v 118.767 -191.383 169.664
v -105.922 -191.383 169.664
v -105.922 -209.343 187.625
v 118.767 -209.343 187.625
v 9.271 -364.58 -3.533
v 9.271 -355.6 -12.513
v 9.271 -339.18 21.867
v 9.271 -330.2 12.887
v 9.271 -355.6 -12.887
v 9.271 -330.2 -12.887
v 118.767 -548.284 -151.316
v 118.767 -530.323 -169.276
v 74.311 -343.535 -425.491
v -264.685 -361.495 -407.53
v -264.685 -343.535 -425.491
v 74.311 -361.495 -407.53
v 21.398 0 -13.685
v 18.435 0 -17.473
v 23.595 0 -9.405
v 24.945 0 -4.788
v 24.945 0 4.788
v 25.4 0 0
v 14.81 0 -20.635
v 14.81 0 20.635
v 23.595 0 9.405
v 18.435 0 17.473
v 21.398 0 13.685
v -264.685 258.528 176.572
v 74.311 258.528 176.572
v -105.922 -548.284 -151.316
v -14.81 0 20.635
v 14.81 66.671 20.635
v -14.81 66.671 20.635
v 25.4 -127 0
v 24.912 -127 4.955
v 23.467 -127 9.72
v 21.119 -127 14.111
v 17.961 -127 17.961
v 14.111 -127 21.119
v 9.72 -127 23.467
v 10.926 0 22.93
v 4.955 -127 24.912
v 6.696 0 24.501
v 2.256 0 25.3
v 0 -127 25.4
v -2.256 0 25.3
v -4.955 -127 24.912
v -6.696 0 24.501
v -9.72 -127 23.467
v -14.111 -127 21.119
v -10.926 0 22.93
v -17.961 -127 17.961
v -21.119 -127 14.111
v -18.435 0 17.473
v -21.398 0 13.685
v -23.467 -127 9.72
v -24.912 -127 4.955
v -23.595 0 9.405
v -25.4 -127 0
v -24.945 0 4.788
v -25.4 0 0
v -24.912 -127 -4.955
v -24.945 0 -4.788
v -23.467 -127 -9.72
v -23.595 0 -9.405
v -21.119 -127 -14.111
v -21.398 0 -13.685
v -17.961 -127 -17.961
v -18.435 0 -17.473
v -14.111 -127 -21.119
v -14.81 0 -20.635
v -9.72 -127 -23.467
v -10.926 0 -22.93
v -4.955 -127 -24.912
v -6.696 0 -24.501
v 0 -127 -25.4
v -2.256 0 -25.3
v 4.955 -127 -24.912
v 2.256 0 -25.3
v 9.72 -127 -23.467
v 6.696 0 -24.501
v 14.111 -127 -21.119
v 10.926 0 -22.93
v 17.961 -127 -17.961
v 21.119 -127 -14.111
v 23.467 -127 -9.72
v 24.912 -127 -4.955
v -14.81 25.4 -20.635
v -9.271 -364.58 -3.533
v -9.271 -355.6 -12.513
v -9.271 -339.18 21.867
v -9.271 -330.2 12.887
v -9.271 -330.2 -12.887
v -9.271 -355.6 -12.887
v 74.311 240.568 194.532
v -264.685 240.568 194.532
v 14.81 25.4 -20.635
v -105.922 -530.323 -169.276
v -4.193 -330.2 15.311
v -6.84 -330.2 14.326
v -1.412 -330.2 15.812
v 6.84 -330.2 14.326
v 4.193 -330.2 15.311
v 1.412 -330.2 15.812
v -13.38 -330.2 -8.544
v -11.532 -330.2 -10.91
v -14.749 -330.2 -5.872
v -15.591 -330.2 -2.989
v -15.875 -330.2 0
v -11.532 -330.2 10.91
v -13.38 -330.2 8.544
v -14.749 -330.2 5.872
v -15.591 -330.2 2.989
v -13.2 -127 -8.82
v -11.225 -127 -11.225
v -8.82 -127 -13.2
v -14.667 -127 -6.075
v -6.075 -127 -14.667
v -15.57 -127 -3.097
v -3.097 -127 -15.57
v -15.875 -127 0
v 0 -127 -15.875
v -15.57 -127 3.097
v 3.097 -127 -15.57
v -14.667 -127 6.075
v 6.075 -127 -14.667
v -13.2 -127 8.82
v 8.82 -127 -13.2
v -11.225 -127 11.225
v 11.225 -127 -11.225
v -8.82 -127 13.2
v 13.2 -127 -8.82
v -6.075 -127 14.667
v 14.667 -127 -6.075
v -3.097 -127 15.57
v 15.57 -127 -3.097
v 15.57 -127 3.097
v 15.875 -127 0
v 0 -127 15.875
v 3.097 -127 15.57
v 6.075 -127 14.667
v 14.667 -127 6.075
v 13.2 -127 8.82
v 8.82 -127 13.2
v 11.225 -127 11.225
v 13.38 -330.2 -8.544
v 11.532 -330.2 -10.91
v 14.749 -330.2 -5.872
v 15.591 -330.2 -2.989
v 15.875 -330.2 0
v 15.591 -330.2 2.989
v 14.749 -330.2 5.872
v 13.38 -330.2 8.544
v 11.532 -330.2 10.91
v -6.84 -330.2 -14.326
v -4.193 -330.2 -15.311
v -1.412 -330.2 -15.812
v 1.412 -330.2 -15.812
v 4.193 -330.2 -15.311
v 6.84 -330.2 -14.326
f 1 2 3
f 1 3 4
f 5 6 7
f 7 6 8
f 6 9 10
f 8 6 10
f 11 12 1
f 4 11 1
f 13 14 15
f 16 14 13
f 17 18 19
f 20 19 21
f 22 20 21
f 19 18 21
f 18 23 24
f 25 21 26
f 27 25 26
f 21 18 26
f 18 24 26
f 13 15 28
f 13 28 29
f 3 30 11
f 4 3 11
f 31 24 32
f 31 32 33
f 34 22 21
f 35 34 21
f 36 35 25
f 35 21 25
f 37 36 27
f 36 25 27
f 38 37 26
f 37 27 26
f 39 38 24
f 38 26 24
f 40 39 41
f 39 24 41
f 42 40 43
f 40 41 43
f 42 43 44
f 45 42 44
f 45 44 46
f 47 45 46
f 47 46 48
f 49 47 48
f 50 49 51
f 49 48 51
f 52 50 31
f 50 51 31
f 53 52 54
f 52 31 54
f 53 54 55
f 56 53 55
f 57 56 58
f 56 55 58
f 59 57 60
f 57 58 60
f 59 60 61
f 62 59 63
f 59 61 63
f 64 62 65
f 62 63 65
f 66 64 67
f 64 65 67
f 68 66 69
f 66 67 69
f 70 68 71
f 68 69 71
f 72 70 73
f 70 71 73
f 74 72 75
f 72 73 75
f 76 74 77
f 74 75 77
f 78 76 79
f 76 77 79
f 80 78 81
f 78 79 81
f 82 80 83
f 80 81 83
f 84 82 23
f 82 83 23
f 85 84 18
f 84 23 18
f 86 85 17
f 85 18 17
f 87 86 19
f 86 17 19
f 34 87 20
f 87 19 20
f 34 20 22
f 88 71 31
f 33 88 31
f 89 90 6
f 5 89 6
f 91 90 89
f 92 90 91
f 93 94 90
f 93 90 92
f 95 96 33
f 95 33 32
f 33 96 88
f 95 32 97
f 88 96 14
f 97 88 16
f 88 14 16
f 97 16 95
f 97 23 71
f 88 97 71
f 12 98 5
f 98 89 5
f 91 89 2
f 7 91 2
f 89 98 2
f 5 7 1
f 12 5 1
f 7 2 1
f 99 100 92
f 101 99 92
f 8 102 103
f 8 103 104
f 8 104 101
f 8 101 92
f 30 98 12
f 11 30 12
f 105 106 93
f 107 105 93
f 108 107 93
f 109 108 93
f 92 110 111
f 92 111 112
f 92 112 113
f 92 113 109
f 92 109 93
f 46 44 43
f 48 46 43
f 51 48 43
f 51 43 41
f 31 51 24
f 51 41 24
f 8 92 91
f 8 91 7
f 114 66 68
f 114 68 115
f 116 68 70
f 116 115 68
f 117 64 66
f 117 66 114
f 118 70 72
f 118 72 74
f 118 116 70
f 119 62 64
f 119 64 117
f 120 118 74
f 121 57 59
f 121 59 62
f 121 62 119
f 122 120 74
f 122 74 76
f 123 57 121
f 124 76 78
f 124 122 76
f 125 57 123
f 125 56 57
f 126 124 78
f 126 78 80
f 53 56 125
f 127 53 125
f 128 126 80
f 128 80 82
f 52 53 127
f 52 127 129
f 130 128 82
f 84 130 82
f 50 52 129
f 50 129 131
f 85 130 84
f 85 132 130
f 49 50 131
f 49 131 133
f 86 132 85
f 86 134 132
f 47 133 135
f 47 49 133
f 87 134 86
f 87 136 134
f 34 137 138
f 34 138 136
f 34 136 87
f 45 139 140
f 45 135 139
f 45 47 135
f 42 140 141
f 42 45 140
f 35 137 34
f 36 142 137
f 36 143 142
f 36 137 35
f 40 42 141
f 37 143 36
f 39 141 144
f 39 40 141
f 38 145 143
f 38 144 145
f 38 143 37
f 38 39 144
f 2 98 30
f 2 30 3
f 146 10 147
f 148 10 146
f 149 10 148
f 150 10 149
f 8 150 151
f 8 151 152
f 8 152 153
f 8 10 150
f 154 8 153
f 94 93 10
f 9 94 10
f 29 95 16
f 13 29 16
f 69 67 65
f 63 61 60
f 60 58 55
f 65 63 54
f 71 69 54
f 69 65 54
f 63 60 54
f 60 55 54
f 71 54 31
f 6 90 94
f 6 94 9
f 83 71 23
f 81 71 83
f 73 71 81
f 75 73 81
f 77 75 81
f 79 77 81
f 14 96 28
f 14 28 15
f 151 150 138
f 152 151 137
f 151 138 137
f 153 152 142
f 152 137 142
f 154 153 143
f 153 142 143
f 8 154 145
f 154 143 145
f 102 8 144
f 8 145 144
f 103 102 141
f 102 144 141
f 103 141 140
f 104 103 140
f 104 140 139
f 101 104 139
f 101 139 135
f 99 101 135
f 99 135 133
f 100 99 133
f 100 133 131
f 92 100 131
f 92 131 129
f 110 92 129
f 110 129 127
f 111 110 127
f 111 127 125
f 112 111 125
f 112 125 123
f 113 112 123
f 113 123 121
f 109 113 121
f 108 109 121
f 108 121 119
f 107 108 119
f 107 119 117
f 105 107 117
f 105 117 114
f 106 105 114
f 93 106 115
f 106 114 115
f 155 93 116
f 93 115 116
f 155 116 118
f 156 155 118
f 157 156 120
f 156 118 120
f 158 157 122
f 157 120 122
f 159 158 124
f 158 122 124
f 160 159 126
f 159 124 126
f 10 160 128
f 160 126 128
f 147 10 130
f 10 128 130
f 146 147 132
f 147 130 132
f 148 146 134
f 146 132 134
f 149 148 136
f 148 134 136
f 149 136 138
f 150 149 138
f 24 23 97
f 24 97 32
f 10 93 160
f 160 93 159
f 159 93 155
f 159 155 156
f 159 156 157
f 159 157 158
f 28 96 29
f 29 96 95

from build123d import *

# Parameters (mm, degrees)
F0_R         = 25.4
F1_DEPTH     = 127
F2_R         = 15.875
F3_DEPTH     = 203.2
F4_W         = 18.542
F4_H         = 25.7731786165
F5_DEPTH     = 25.4
F6_SIZE      = 25.39999
F7_W         = 18.542
F7_H         = 35.9210244843
F8_DEPTH     = 12.7
F9_W         = 29.620467016
F9_H         = 41.2706667472
F10_DEPTH    = 76.2
F11_T1_DEPTH = 290.9034585933
F12_W        = 224.6891856194
F12_H        = 479.333948344
F13_DEPTH    = 25.4
F14_W        = 338.9952555299
F14_H        = 851.445376873
F15_DEPTH    = 25.4


# Not quite as in the source:
# - a fillet or chamfer that OpenCascade refuses, or shapes differently, is made with other operations: its cross-section is extruded or revolved along the edge and cut away or added
# - a fillet or chamfer is up to 0.001 mm smaller than in the source, because OpenCascade refuses the exact size


with BuildPart() as f1:
    # F0 (on Front) → F1 (new body)
    with BuildSketch(Plane.XZ):
        Circle(F0_R)
    extrude(amount=F1_DEPTH)

    # F2 (on face) → F3 (join)
    with BuildSketch(Plane.XZ.offset(127)):
        Circle(F2_R)
    extrude(amount=F3_DEPTH)

    # F4 (on face) → F5 (join)
    with BuildSketch(Plane.XZ.offset(330.2)):
        Rectangle(F4_W, F4_H)
    extrude(amount=F5_DEPTH)

    # F6 (size 25.4 in the source; OpenCascade refuses exactly that, so slightly less here)
    f6_edges = [f1.edges().sort_by_distance(p)[0] for p in [
        (0, -355.6, 12.886589),
    ]]
    chamfer(f6_edges, length=F6_SIZE)

    # F7 (on face) → F8 (join)
    with BuildSketch(Plane(origin=(0, -171.5432946541, 171.5432946541), x_dir=(1, 0, 0), z_dir=(0, -0.7071067812, 0.7071067812))):
        with Locations((0, -242.3349767037)):
            Rectangle(F7_W, F7_H)
    extrude(amount=F8_DEPTH)

    # F9 (on face) → F10 (join)
    with BuildSketch(Plane(origin=(0, 0, 0), x_dir=(-1, 0, 0), z_dir=(0, 1, 0))):
        with Locations((-1.508e-06, -1.0823e-06)):
            Rectangle(F9_W, F9_H)
    extrude(amount=F10_DEPTH)

    # F11: chamfer of 50.8 on 1 edges, made by hand

    # F11_s2 → F11_t1 (cut)
    with BuildSketch(Plane.YZ.offset(-145.4517277887)):
        Polygon((25.4, -20.6353344559), (76.2, 30.1646655441), (76.2, -20.6353344559), align=None)
    extrude(amount=F11_T1_DEPTH, mode=Mode.SUBTRACT)

    # F12 (on face) → F13 (join)
    with BuildSketch(Plane(origin=(0, -180.5235507752, 180.5235507752), x_dir=(1, 0, 0), z_dir=(0, -0.7071067812, 0.7071067812))):
        with Locations((6.4224079251, -255.024516955)):
            Rectangle(F12_W, F12_H)
    extrude(amount=F13_DEPTH)

    # F14 (on face) → F15 (join)
    with BuildSketch(Plane(origin=(0, 23.0176672279, -23.0176672279), x_dir=(1, 0, 0), z_dir=(0, 0.7071067812, -0.7071067812))):
        with Locations((-95.1869599521, 118.0603802204)):
            Rectangle(F14_W, F14_H)
    extrude(amount=F15_DEPTH)


solid = f1.part
